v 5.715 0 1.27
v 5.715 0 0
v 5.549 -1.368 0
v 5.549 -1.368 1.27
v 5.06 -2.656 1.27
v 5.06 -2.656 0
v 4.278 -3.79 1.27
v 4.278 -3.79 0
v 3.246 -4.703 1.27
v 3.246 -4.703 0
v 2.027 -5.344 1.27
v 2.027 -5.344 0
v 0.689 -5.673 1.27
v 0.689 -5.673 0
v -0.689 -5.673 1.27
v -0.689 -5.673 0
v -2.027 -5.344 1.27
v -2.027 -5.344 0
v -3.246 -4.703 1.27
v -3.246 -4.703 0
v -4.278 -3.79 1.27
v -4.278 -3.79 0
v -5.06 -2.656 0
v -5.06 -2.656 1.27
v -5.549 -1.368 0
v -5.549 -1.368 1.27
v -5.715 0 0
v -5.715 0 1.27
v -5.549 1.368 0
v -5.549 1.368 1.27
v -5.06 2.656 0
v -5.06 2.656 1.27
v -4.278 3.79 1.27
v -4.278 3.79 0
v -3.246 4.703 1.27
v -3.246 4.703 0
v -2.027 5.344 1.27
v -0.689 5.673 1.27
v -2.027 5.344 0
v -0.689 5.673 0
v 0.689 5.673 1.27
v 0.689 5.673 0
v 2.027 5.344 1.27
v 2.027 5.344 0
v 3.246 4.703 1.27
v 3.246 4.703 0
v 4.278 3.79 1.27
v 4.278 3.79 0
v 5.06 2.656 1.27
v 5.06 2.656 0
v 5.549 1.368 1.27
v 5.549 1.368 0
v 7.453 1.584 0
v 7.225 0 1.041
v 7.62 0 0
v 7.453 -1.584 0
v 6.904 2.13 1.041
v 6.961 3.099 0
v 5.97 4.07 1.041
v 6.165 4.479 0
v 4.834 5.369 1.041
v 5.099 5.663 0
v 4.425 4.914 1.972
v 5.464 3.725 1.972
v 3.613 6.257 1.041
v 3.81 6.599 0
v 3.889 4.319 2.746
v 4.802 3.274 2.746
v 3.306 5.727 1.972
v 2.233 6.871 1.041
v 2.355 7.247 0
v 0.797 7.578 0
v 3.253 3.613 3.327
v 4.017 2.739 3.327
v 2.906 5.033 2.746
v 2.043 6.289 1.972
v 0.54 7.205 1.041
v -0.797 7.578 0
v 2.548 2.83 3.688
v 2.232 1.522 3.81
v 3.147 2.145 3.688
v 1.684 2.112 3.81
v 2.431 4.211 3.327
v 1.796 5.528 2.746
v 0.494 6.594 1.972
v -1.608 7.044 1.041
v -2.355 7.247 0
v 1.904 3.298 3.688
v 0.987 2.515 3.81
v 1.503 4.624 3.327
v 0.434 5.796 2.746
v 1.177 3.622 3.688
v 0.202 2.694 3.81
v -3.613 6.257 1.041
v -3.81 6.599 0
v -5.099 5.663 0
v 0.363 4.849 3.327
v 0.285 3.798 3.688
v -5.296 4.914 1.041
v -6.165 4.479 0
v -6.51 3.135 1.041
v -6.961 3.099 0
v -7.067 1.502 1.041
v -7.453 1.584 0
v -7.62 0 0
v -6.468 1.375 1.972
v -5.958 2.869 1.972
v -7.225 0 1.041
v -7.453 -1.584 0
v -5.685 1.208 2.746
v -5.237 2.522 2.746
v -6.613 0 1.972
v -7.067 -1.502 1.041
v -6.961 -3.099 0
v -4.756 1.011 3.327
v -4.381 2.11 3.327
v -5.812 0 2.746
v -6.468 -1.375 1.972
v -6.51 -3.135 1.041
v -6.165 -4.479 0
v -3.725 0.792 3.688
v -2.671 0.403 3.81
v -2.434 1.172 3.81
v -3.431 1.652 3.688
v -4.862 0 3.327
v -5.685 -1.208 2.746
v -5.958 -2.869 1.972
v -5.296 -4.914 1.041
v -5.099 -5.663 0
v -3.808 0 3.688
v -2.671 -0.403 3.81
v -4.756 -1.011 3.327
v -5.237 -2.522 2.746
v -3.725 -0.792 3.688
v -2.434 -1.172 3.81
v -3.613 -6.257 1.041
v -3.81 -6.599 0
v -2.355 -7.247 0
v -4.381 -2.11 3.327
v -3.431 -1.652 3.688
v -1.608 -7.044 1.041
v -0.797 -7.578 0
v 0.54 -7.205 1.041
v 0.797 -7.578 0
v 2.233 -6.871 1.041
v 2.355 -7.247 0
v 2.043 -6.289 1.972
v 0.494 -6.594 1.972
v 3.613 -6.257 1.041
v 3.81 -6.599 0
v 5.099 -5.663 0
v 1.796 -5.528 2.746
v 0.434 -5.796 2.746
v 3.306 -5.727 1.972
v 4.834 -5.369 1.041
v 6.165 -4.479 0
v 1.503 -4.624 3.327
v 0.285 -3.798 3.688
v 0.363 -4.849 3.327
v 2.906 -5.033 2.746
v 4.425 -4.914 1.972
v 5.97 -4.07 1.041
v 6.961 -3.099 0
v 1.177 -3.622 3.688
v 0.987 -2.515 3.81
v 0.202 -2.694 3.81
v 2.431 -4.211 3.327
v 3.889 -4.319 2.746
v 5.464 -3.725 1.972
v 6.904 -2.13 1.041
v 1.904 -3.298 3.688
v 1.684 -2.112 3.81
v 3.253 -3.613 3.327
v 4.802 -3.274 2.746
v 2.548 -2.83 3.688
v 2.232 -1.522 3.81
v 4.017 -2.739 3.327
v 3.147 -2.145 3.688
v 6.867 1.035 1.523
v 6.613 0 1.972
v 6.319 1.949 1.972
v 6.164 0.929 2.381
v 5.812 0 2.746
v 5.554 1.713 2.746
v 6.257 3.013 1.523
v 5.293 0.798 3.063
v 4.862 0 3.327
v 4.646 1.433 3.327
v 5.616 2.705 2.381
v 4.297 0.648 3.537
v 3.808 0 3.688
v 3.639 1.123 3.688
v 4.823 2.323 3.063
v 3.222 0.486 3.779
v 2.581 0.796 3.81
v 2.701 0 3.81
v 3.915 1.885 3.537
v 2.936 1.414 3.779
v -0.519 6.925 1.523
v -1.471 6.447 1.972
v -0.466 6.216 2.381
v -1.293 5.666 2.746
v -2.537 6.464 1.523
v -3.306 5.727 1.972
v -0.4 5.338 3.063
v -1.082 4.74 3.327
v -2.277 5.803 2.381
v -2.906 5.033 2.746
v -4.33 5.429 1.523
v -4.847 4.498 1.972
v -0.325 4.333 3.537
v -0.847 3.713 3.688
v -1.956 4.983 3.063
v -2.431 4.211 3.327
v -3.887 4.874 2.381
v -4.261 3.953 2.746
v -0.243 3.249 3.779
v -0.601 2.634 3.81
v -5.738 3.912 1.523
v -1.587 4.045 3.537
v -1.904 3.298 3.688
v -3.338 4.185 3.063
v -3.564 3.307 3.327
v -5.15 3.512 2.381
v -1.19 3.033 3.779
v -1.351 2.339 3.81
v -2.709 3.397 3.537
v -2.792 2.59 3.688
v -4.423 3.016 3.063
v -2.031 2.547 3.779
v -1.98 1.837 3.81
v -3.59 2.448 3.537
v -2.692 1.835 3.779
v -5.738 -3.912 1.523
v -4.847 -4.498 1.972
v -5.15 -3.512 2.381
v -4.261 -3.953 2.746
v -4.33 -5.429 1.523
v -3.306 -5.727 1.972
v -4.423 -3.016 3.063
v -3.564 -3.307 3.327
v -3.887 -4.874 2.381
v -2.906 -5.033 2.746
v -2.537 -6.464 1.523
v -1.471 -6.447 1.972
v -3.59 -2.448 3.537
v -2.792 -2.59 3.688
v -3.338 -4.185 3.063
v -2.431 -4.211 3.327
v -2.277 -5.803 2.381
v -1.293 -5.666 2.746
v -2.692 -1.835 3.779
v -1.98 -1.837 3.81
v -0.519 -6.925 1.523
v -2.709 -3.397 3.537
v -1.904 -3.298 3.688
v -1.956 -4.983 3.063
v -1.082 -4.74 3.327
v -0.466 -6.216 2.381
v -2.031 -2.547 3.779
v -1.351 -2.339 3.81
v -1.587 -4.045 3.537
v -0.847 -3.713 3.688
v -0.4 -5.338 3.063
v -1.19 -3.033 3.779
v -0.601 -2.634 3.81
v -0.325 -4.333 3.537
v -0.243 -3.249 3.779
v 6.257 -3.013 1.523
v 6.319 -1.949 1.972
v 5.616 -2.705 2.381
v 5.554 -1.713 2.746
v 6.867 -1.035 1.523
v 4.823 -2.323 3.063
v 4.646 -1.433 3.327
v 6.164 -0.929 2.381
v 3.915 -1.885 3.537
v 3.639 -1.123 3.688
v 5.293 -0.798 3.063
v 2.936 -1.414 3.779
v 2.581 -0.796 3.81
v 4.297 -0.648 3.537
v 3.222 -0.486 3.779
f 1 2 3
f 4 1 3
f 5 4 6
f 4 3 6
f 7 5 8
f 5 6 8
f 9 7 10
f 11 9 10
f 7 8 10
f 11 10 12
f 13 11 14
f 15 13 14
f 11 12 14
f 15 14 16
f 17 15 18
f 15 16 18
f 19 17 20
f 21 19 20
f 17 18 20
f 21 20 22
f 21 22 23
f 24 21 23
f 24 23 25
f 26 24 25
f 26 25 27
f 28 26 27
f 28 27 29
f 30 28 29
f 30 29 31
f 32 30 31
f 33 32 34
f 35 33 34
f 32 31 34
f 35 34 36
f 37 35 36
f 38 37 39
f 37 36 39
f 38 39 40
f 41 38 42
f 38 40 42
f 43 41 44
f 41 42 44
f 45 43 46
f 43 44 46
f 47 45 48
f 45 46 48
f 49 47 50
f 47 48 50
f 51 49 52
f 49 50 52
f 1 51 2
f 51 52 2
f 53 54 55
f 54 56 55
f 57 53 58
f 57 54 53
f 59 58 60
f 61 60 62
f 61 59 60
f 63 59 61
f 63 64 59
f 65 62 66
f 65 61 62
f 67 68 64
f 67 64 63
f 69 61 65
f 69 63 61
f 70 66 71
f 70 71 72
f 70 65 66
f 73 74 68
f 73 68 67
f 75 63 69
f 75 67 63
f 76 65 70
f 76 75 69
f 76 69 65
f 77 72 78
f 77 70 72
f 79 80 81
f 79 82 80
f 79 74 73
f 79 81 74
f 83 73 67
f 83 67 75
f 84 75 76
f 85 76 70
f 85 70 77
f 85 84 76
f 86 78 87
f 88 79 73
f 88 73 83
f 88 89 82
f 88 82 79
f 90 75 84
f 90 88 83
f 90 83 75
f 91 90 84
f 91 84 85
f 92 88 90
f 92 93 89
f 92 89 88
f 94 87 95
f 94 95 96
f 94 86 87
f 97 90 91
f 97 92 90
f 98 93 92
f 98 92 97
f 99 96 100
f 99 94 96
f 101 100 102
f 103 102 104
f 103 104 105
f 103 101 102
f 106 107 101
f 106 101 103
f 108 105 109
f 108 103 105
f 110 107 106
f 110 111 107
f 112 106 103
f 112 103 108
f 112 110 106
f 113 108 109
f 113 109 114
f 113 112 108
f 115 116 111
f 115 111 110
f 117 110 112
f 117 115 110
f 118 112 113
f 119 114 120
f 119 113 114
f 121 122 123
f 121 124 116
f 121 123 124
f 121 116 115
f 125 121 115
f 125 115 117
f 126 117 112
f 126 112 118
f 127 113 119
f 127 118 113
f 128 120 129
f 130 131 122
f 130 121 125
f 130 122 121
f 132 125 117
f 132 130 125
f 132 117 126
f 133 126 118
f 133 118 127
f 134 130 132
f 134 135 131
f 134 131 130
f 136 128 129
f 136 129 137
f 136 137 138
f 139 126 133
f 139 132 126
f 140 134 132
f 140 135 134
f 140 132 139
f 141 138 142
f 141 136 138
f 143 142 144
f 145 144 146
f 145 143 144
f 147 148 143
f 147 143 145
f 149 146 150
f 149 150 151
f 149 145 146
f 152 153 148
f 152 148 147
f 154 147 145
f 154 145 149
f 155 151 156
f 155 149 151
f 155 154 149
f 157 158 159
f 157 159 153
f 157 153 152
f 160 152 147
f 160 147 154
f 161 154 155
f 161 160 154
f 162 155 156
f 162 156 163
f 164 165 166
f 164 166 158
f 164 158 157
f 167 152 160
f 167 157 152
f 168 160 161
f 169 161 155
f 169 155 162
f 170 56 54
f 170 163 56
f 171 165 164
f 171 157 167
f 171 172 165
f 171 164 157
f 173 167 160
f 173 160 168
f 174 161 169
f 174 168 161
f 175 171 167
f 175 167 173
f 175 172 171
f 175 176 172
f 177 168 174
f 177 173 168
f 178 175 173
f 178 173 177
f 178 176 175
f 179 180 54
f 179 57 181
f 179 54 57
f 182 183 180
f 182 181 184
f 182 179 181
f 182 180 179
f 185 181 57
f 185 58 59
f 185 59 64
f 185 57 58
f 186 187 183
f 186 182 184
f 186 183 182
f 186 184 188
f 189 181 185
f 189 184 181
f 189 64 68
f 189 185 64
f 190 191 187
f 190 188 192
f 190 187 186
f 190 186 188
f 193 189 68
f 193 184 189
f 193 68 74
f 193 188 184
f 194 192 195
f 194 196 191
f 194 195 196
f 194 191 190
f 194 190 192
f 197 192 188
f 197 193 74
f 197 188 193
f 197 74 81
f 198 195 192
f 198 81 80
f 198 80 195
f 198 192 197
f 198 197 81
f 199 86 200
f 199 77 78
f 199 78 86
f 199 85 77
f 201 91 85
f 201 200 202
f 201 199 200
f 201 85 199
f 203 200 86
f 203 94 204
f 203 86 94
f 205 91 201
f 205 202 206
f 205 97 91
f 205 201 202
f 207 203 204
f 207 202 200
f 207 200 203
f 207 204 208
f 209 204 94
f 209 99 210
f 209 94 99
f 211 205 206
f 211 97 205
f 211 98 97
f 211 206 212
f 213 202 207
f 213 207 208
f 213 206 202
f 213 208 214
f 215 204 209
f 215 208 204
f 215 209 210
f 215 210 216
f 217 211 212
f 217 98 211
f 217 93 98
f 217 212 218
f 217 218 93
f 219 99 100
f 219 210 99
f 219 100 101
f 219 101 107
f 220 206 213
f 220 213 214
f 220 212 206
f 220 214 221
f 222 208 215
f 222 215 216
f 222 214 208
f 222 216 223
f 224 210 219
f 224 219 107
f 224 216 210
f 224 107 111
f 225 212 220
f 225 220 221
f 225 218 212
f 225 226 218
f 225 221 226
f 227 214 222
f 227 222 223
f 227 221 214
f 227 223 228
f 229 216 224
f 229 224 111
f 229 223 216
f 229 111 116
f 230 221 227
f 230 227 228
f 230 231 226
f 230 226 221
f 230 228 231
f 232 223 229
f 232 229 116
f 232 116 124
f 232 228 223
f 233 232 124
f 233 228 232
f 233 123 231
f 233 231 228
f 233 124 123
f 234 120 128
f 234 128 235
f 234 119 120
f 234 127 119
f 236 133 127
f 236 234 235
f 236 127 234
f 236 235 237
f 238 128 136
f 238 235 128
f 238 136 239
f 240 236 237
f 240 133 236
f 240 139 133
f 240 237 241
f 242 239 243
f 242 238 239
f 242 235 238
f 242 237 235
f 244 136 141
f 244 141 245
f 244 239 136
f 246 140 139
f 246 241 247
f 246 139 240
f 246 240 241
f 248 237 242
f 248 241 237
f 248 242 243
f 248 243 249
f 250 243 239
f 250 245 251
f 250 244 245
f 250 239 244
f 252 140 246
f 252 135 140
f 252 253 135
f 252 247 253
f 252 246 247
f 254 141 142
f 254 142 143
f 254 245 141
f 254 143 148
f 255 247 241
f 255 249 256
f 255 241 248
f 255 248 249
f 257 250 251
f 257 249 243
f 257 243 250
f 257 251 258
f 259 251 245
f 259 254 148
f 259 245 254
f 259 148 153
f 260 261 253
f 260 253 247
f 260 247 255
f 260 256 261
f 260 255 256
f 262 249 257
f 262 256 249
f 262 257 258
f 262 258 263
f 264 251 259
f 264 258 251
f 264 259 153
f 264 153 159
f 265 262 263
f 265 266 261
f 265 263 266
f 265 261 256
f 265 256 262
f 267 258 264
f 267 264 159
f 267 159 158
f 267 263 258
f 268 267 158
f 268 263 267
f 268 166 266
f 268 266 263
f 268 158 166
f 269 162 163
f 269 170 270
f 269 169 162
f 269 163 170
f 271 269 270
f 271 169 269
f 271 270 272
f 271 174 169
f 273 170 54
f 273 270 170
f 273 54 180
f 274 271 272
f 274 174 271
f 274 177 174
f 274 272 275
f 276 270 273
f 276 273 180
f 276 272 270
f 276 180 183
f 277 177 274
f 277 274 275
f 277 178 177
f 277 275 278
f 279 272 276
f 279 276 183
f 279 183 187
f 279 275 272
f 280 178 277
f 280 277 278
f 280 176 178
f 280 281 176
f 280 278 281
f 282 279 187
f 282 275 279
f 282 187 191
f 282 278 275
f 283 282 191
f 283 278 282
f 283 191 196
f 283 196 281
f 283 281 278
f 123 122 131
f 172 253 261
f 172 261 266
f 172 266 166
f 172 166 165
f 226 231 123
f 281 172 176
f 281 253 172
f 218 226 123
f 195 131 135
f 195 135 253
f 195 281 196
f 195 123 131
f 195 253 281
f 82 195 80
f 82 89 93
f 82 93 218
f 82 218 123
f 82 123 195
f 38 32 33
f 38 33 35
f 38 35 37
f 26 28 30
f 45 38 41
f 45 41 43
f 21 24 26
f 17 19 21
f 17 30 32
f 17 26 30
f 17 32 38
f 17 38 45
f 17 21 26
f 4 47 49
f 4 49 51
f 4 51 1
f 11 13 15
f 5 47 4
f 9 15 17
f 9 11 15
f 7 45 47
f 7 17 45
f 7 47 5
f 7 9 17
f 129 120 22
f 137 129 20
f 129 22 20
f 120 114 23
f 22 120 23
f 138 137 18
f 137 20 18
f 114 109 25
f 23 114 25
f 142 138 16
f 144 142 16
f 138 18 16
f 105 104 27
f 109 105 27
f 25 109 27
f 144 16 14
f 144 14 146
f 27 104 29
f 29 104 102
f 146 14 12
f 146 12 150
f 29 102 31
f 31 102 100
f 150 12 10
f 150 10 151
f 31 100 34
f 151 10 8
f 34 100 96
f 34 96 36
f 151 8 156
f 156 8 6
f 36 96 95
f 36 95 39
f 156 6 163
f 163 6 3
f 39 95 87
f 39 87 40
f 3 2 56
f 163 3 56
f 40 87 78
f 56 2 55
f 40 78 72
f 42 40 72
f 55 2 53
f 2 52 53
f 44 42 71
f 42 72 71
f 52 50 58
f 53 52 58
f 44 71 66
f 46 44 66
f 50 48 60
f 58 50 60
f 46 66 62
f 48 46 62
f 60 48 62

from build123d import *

# Parameters (mm, degrees)
F0_R     = 7.62
F1_DEPTH = 3.81
F3_R     = 5.715
F4_DEPTH = 1.27


# Not quite as in the source:
# - a fillet or chamfer that OpenCascade refuses, or shapes differently, is made with other operations: its cross-section is extruded or revolved along the edge and cut away or added


with BuildPart() as f1:
    # F0 (on Top) → F1 (new body)
    with BuildSketch(Plane.XY):
        Circle(F0_R)
    extrude(amount=F1_DEPTH)

    # F2: fillet of radius 5.08 on 1 edges, made by hand

    # F2_s1 → F2_t2 (revolve, cut)
    with BuildSketch(Plane.XZ):
        with BuildLine():
            ThreePointArc((7.62, 0), (5.8121631237, 2.7460926284), (2.7013111503, 3.81))
            Line((2.7013111503, 3.81), (7.62, 3.81))
            Line((7.62, 3.81), (7.62, 0))
        make_face()
    revolve(axis=Axis((0, 0, 3.81), (0, 0, 1)), mode=Mode.SUBTRACT)

    # F3 (on face) → F4 (cut)
    with BuildSketch(Plane(origin=(0, 0, 0), x_dir=(1, 0, 0), z_dir=(0, 0, -1))):
        Circle(F3_R)
    extrude(amount=-F4_DEPTH, mode=Mode.SUBTRACT)


solid = f1.part
